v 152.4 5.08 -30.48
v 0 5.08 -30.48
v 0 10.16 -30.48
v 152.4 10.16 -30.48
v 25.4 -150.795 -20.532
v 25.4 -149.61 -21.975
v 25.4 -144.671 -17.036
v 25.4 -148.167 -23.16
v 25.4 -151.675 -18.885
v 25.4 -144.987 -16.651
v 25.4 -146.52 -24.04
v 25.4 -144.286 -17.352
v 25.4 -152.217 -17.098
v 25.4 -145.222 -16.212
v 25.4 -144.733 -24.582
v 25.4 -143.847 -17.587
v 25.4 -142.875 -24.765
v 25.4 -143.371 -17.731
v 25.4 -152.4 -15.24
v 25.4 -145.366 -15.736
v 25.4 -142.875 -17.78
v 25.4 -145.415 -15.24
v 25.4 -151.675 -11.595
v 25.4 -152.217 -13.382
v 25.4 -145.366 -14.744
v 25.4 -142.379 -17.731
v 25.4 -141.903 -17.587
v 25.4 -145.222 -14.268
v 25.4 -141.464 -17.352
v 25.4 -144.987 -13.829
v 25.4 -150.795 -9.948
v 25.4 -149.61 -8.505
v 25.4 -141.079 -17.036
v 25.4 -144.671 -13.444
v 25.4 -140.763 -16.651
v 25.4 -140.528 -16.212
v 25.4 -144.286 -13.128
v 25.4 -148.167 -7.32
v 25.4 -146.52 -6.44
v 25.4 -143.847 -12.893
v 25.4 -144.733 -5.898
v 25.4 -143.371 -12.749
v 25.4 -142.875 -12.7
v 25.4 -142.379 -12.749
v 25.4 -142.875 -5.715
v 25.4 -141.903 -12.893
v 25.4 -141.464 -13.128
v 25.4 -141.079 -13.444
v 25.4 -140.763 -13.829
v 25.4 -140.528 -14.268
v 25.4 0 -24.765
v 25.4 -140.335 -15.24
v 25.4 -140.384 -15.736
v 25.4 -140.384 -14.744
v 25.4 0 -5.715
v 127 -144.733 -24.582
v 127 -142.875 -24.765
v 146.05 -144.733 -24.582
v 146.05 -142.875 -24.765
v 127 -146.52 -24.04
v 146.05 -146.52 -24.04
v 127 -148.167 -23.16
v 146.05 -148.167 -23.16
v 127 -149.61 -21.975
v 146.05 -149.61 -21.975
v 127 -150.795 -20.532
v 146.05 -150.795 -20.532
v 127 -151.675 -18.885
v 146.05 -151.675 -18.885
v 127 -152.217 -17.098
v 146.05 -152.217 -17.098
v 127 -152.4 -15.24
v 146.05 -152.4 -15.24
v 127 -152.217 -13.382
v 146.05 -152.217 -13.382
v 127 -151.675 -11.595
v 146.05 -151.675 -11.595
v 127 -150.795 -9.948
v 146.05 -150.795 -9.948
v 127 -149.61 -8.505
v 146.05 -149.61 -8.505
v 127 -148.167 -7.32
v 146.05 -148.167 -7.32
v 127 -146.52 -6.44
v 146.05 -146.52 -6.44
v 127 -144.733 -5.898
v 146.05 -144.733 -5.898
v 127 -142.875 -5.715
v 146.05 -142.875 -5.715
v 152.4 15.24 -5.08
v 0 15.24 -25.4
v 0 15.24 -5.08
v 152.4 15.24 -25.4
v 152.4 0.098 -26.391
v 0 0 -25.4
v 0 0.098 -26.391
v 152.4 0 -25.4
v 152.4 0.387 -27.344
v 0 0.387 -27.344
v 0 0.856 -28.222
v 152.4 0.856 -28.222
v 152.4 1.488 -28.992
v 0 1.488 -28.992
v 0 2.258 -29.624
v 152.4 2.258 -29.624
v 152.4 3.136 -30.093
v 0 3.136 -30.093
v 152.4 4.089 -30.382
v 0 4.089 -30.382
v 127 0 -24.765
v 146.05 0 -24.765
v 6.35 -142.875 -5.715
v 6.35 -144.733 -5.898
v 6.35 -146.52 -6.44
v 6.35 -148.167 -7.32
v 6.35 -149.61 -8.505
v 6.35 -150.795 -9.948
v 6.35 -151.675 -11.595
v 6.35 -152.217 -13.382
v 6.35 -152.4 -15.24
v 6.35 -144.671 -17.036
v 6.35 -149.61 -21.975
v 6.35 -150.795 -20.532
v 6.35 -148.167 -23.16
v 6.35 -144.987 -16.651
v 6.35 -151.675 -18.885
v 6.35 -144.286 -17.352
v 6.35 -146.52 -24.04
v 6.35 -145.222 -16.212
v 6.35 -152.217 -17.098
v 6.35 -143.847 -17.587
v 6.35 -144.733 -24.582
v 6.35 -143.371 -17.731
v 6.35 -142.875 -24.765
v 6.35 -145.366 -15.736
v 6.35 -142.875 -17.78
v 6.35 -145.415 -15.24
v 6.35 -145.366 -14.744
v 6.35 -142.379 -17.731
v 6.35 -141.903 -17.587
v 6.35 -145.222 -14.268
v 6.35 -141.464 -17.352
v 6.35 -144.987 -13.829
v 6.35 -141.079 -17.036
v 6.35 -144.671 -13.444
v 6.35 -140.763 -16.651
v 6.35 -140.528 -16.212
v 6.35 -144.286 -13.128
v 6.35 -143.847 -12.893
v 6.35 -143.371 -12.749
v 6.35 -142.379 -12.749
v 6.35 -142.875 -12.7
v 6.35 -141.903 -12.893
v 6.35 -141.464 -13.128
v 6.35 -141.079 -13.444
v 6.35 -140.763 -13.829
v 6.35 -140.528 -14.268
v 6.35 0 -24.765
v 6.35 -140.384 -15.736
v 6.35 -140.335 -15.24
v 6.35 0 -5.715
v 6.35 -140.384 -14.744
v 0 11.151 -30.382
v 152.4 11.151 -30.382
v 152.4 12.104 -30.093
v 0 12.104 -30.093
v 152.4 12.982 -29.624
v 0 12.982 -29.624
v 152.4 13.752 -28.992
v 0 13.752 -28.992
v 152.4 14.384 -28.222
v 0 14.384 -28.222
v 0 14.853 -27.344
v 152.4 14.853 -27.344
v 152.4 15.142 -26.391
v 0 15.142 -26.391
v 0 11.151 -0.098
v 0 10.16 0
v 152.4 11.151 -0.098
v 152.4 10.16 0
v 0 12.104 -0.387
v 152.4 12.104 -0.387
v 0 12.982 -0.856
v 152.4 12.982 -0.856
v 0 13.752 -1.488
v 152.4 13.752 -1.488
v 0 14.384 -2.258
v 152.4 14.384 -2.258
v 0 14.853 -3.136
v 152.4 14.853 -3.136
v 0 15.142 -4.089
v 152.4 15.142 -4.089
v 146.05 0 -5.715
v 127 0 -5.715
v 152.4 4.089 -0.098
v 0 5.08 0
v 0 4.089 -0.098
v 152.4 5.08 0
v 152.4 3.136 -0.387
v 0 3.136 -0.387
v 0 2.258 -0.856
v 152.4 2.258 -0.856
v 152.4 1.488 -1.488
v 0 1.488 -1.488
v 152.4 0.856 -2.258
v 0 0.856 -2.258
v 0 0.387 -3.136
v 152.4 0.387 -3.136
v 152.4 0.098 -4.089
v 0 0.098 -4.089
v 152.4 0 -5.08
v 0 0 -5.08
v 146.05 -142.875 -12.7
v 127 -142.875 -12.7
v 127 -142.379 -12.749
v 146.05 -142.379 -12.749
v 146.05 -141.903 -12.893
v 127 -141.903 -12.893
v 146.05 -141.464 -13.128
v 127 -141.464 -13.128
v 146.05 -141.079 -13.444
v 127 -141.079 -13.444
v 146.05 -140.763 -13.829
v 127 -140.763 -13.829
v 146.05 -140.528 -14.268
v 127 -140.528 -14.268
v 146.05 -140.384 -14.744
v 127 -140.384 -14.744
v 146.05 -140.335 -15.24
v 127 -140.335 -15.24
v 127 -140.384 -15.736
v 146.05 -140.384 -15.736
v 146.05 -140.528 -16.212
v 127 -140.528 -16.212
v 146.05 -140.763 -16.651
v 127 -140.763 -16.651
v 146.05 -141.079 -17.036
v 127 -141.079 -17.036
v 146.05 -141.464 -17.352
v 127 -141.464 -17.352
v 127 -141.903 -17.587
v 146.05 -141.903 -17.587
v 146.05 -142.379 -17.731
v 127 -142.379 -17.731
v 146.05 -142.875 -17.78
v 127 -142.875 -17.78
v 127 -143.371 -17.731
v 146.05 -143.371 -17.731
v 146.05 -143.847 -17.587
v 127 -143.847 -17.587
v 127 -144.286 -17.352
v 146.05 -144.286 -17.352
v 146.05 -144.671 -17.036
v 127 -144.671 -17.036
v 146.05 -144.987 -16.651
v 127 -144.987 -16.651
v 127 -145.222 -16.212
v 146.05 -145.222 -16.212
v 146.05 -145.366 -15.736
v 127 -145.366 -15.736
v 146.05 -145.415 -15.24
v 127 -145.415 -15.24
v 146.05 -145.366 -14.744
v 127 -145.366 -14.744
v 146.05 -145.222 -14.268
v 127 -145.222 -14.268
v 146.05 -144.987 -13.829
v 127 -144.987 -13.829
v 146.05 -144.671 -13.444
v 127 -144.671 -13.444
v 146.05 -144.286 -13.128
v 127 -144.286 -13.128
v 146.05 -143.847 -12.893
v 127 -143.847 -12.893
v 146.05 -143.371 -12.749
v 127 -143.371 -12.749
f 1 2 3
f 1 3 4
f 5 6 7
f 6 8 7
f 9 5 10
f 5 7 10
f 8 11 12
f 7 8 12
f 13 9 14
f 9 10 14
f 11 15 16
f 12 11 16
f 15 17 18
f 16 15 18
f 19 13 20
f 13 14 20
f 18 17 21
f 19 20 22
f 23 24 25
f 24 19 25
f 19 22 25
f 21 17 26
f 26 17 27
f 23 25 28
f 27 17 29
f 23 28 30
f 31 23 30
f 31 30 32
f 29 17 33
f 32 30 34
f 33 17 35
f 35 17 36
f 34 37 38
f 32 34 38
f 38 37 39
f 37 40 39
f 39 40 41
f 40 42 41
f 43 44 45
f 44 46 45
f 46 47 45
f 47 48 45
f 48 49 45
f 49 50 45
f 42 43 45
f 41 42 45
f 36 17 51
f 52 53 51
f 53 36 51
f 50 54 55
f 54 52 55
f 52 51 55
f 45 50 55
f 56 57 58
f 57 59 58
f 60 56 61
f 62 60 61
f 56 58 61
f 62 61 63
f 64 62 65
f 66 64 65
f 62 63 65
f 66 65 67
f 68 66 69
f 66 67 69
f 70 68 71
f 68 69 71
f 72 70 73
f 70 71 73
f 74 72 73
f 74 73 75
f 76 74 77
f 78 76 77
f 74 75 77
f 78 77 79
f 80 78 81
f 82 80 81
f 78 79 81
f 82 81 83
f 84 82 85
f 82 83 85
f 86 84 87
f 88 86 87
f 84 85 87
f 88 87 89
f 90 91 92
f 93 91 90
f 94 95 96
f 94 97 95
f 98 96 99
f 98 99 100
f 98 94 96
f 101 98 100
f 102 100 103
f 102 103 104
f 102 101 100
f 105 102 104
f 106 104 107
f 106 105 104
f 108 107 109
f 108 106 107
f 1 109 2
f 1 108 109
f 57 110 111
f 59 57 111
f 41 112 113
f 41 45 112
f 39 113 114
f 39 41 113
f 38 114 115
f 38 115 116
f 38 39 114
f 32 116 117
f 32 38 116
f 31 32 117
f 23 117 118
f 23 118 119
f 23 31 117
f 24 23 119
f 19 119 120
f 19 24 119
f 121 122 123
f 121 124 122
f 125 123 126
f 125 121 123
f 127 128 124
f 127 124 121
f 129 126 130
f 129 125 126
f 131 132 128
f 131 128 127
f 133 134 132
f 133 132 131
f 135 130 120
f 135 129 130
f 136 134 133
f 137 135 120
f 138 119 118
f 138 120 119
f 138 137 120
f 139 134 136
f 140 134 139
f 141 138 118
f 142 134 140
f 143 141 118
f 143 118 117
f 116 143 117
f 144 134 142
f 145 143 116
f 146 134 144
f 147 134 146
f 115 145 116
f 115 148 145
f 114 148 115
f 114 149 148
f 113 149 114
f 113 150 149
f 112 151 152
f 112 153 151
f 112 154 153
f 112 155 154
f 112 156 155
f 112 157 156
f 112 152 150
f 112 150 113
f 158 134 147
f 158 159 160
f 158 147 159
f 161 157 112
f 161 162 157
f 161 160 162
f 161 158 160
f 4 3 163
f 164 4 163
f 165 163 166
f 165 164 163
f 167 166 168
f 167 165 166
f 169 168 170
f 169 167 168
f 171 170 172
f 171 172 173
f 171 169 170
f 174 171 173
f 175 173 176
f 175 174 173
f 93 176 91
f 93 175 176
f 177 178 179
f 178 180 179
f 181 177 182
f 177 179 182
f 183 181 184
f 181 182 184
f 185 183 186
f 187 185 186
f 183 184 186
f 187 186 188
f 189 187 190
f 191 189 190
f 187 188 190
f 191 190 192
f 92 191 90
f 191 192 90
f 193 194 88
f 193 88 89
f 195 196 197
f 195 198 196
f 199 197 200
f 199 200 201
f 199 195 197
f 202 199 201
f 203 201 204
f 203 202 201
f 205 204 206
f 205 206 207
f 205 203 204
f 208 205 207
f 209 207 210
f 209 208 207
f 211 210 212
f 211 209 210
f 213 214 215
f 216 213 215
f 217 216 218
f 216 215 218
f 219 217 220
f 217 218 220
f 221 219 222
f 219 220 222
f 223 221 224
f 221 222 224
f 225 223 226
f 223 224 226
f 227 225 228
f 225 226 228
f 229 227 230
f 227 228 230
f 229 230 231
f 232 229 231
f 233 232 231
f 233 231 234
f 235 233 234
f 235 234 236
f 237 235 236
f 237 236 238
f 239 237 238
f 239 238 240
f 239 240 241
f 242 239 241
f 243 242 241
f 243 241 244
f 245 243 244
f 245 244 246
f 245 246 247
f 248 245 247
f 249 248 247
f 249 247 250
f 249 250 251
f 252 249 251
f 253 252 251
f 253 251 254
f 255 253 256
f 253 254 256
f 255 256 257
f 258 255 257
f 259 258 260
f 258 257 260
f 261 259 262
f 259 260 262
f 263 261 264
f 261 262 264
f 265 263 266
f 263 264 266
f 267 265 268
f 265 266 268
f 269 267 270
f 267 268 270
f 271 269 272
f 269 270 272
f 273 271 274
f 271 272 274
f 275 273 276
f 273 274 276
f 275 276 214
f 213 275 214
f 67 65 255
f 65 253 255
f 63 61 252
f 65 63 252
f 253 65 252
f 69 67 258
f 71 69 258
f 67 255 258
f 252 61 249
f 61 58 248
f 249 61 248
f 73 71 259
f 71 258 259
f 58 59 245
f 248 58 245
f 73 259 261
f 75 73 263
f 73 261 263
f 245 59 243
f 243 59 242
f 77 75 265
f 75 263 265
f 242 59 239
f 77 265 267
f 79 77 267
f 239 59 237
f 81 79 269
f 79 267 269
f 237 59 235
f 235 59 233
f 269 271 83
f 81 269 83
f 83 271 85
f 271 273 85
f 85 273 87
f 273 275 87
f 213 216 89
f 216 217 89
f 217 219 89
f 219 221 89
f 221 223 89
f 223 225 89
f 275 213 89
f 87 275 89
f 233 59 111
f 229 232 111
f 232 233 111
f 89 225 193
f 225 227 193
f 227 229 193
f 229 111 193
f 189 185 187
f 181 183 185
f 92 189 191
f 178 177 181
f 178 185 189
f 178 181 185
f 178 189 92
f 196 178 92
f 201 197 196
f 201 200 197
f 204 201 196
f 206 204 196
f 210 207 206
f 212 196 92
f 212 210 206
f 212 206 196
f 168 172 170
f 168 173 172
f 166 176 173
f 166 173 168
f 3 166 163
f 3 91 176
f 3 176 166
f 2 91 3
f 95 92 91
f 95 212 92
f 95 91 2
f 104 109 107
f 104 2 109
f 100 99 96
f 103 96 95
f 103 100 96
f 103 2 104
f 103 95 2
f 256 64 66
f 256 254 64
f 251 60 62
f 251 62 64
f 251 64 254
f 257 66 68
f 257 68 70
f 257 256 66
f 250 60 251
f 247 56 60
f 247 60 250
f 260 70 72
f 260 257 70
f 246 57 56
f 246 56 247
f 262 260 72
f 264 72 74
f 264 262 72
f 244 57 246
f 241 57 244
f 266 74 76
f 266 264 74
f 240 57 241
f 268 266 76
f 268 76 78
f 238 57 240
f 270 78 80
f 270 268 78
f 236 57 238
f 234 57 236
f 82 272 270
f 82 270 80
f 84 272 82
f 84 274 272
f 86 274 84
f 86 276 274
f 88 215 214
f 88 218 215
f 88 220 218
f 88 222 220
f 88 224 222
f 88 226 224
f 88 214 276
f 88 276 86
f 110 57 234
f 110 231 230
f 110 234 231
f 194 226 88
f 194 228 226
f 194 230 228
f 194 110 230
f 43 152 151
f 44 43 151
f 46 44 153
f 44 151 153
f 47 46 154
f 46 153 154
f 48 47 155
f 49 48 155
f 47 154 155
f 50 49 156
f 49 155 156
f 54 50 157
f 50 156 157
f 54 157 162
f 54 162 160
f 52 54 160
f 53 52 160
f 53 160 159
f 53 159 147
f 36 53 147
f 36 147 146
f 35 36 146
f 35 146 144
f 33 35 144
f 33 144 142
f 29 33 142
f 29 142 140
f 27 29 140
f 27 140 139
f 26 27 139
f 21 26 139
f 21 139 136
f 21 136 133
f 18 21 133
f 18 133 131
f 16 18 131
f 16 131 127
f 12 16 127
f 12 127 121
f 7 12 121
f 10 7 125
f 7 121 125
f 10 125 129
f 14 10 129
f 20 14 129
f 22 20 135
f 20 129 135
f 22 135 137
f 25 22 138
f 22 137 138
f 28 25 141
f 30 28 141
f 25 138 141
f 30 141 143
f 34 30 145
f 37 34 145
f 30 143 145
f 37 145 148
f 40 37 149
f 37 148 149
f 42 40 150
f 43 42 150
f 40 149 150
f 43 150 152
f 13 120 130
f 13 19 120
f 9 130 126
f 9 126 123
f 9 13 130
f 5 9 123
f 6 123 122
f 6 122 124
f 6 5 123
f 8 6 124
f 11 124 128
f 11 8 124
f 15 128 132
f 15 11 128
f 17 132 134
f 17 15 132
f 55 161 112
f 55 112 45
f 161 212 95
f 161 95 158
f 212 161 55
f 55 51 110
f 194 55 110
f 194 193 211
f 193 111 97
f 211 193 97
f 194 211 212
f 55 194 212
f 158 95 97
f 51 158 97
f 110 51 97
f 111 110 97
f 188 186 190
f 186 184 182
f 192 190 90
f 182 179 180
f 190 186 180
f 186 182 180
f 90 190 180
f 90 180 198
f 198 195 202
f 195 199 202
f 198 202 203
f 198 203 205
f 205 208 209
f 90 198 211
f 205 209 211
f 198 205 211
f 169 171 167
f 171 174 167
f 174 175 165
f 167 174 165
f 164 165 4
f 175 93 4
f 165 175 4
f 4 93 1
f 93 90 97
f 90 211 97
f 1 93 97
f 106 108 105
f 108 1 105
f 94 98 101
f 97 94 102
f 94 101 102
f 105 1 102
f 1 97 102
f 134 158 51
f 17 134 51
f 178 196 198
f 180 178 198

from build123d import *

# Parameters (mm, degrees)
SKETCH1_W           = 152.4
SKETCH1_H           = 30.48
BOSS_EXTRUDE1_DEPTH = 15.24
SKETCH2_W           = 19.05
SKETCH2_H           = 19.05
BOSS_EXTRUDE2_DEPTH = 152.4
SKETCH3_R           = 2.54
CUT_EXTRUDE1_DEPTH  = 214.273047758
FILLET1_R           = 9.525
FILLET2_R           = 9.525
FILLET3_R           = 9.525
FILLET4_R           = 9.525
FILLET5_R           = 5.08
FILLET6_R           = 5.08
FILLET7_R           = 5.08
FILLET8_R           = 5.08


with BuildPart() as part:
    # Sketch1 → Boss-Extrude1 (new body)
    with BuildSketch(Plane(origin=(0, 0, 0), x_dir=(1, 0, 0), z_dir=(0, 1, 0))):
        with Locations((76.2, 15.24)):
            Rectangle(SKETCH1_W, SKETCH1_H)
    extrude(amount=BOSS_EXTRUDE1_DEPTH)

    # Sketch2 → Boss-Extrude2 (add)
    with BuildSketch(Plane.XZ):
        with Locations((136.525, -15.24)):
            Rectangle(SKETCH2_W, SKETCH2_H)
        with Locations((15.875, -15.24)):
            Rectangle(SKETCH2_W, SKETCH2_H)
    extrude(amount=BOSS_EXTRUDE2_DEPTH)

    # Sketch3 → Cut-Extrude1 (cut, through all)
    with BuildSketch(Plane.ZY.offset(-6.35)):
        with Locations((-15.24, -142.875)):
            Circle(SKETCH3_R)
    extrude(amount=-CUT_EXTRUDE1_DEPTH, mode=Mode.SUBTRACT)

    # Fillet1
    fillet1_edges = [part.edges().sort_by_distance(p)[0] for p in [
        (15.875, -152.4, -5.715),
    ]]
    fillet(fillet1_edges, radius=FILLET1_R)

    # Fillet2
    fillet2_edges = [part.edges().sort_by_distance(p)[0] for p in [
        (15.875, -152.4, -24.765),
    ]]
    fillet(fillet2_edges, radius=FILLET2_R - 0.0001)  # a hair under: the kernel refuses the full size

    # Fillet3
    fillet3_edges = [part.edges().sort_by_distance(p)[0] for p in [
        (136.525, -152.4, -24.765),
    ]]
    fillet(fillet3_edges, radius=FILLET3_R)

    # Fillet4
    fillet4_edges = [part.edges().sort_by_distance(p)[0] for p in [
        (136.525, -152.4, -5.715),
    ]]
    fillet(fillet4_edges, radius=FILLET4_R - 0.0001)  # a hair under: the kernel refuses the full size

    # Fillet5
    fillet5_edges = [part.edges().sort_by_distance(p)[0] for p in [
        (76.2, 15.24, 0),
    ]]
    fillet(fillet5_edges, radius=FILLET5_R)

    # Fillet6
    fillet6_edges = [part.edges().sort_by_distance(p)[0] for p in [
        (76.2, 0, 0),
    ]]
    fillet(fillet6_edges, radius=FILLET6_R)

    # Fillet7
    fillet7_edges = [part.edges().sort_by_distance(p)[0] for p in [
        (76.2, 0, -30.48),
    ]]
    fillet(fillet7_edges, radius=FILLET7_R)

    # Fillet8
    fillet8_edges = [part.edges().sort_by_distance(p)[0] for p in [
        (76.2, 15.24, -30.48),
    ]]
    fillet(fillet8_edges, radius=FILLET8_R)


solid = part.part
